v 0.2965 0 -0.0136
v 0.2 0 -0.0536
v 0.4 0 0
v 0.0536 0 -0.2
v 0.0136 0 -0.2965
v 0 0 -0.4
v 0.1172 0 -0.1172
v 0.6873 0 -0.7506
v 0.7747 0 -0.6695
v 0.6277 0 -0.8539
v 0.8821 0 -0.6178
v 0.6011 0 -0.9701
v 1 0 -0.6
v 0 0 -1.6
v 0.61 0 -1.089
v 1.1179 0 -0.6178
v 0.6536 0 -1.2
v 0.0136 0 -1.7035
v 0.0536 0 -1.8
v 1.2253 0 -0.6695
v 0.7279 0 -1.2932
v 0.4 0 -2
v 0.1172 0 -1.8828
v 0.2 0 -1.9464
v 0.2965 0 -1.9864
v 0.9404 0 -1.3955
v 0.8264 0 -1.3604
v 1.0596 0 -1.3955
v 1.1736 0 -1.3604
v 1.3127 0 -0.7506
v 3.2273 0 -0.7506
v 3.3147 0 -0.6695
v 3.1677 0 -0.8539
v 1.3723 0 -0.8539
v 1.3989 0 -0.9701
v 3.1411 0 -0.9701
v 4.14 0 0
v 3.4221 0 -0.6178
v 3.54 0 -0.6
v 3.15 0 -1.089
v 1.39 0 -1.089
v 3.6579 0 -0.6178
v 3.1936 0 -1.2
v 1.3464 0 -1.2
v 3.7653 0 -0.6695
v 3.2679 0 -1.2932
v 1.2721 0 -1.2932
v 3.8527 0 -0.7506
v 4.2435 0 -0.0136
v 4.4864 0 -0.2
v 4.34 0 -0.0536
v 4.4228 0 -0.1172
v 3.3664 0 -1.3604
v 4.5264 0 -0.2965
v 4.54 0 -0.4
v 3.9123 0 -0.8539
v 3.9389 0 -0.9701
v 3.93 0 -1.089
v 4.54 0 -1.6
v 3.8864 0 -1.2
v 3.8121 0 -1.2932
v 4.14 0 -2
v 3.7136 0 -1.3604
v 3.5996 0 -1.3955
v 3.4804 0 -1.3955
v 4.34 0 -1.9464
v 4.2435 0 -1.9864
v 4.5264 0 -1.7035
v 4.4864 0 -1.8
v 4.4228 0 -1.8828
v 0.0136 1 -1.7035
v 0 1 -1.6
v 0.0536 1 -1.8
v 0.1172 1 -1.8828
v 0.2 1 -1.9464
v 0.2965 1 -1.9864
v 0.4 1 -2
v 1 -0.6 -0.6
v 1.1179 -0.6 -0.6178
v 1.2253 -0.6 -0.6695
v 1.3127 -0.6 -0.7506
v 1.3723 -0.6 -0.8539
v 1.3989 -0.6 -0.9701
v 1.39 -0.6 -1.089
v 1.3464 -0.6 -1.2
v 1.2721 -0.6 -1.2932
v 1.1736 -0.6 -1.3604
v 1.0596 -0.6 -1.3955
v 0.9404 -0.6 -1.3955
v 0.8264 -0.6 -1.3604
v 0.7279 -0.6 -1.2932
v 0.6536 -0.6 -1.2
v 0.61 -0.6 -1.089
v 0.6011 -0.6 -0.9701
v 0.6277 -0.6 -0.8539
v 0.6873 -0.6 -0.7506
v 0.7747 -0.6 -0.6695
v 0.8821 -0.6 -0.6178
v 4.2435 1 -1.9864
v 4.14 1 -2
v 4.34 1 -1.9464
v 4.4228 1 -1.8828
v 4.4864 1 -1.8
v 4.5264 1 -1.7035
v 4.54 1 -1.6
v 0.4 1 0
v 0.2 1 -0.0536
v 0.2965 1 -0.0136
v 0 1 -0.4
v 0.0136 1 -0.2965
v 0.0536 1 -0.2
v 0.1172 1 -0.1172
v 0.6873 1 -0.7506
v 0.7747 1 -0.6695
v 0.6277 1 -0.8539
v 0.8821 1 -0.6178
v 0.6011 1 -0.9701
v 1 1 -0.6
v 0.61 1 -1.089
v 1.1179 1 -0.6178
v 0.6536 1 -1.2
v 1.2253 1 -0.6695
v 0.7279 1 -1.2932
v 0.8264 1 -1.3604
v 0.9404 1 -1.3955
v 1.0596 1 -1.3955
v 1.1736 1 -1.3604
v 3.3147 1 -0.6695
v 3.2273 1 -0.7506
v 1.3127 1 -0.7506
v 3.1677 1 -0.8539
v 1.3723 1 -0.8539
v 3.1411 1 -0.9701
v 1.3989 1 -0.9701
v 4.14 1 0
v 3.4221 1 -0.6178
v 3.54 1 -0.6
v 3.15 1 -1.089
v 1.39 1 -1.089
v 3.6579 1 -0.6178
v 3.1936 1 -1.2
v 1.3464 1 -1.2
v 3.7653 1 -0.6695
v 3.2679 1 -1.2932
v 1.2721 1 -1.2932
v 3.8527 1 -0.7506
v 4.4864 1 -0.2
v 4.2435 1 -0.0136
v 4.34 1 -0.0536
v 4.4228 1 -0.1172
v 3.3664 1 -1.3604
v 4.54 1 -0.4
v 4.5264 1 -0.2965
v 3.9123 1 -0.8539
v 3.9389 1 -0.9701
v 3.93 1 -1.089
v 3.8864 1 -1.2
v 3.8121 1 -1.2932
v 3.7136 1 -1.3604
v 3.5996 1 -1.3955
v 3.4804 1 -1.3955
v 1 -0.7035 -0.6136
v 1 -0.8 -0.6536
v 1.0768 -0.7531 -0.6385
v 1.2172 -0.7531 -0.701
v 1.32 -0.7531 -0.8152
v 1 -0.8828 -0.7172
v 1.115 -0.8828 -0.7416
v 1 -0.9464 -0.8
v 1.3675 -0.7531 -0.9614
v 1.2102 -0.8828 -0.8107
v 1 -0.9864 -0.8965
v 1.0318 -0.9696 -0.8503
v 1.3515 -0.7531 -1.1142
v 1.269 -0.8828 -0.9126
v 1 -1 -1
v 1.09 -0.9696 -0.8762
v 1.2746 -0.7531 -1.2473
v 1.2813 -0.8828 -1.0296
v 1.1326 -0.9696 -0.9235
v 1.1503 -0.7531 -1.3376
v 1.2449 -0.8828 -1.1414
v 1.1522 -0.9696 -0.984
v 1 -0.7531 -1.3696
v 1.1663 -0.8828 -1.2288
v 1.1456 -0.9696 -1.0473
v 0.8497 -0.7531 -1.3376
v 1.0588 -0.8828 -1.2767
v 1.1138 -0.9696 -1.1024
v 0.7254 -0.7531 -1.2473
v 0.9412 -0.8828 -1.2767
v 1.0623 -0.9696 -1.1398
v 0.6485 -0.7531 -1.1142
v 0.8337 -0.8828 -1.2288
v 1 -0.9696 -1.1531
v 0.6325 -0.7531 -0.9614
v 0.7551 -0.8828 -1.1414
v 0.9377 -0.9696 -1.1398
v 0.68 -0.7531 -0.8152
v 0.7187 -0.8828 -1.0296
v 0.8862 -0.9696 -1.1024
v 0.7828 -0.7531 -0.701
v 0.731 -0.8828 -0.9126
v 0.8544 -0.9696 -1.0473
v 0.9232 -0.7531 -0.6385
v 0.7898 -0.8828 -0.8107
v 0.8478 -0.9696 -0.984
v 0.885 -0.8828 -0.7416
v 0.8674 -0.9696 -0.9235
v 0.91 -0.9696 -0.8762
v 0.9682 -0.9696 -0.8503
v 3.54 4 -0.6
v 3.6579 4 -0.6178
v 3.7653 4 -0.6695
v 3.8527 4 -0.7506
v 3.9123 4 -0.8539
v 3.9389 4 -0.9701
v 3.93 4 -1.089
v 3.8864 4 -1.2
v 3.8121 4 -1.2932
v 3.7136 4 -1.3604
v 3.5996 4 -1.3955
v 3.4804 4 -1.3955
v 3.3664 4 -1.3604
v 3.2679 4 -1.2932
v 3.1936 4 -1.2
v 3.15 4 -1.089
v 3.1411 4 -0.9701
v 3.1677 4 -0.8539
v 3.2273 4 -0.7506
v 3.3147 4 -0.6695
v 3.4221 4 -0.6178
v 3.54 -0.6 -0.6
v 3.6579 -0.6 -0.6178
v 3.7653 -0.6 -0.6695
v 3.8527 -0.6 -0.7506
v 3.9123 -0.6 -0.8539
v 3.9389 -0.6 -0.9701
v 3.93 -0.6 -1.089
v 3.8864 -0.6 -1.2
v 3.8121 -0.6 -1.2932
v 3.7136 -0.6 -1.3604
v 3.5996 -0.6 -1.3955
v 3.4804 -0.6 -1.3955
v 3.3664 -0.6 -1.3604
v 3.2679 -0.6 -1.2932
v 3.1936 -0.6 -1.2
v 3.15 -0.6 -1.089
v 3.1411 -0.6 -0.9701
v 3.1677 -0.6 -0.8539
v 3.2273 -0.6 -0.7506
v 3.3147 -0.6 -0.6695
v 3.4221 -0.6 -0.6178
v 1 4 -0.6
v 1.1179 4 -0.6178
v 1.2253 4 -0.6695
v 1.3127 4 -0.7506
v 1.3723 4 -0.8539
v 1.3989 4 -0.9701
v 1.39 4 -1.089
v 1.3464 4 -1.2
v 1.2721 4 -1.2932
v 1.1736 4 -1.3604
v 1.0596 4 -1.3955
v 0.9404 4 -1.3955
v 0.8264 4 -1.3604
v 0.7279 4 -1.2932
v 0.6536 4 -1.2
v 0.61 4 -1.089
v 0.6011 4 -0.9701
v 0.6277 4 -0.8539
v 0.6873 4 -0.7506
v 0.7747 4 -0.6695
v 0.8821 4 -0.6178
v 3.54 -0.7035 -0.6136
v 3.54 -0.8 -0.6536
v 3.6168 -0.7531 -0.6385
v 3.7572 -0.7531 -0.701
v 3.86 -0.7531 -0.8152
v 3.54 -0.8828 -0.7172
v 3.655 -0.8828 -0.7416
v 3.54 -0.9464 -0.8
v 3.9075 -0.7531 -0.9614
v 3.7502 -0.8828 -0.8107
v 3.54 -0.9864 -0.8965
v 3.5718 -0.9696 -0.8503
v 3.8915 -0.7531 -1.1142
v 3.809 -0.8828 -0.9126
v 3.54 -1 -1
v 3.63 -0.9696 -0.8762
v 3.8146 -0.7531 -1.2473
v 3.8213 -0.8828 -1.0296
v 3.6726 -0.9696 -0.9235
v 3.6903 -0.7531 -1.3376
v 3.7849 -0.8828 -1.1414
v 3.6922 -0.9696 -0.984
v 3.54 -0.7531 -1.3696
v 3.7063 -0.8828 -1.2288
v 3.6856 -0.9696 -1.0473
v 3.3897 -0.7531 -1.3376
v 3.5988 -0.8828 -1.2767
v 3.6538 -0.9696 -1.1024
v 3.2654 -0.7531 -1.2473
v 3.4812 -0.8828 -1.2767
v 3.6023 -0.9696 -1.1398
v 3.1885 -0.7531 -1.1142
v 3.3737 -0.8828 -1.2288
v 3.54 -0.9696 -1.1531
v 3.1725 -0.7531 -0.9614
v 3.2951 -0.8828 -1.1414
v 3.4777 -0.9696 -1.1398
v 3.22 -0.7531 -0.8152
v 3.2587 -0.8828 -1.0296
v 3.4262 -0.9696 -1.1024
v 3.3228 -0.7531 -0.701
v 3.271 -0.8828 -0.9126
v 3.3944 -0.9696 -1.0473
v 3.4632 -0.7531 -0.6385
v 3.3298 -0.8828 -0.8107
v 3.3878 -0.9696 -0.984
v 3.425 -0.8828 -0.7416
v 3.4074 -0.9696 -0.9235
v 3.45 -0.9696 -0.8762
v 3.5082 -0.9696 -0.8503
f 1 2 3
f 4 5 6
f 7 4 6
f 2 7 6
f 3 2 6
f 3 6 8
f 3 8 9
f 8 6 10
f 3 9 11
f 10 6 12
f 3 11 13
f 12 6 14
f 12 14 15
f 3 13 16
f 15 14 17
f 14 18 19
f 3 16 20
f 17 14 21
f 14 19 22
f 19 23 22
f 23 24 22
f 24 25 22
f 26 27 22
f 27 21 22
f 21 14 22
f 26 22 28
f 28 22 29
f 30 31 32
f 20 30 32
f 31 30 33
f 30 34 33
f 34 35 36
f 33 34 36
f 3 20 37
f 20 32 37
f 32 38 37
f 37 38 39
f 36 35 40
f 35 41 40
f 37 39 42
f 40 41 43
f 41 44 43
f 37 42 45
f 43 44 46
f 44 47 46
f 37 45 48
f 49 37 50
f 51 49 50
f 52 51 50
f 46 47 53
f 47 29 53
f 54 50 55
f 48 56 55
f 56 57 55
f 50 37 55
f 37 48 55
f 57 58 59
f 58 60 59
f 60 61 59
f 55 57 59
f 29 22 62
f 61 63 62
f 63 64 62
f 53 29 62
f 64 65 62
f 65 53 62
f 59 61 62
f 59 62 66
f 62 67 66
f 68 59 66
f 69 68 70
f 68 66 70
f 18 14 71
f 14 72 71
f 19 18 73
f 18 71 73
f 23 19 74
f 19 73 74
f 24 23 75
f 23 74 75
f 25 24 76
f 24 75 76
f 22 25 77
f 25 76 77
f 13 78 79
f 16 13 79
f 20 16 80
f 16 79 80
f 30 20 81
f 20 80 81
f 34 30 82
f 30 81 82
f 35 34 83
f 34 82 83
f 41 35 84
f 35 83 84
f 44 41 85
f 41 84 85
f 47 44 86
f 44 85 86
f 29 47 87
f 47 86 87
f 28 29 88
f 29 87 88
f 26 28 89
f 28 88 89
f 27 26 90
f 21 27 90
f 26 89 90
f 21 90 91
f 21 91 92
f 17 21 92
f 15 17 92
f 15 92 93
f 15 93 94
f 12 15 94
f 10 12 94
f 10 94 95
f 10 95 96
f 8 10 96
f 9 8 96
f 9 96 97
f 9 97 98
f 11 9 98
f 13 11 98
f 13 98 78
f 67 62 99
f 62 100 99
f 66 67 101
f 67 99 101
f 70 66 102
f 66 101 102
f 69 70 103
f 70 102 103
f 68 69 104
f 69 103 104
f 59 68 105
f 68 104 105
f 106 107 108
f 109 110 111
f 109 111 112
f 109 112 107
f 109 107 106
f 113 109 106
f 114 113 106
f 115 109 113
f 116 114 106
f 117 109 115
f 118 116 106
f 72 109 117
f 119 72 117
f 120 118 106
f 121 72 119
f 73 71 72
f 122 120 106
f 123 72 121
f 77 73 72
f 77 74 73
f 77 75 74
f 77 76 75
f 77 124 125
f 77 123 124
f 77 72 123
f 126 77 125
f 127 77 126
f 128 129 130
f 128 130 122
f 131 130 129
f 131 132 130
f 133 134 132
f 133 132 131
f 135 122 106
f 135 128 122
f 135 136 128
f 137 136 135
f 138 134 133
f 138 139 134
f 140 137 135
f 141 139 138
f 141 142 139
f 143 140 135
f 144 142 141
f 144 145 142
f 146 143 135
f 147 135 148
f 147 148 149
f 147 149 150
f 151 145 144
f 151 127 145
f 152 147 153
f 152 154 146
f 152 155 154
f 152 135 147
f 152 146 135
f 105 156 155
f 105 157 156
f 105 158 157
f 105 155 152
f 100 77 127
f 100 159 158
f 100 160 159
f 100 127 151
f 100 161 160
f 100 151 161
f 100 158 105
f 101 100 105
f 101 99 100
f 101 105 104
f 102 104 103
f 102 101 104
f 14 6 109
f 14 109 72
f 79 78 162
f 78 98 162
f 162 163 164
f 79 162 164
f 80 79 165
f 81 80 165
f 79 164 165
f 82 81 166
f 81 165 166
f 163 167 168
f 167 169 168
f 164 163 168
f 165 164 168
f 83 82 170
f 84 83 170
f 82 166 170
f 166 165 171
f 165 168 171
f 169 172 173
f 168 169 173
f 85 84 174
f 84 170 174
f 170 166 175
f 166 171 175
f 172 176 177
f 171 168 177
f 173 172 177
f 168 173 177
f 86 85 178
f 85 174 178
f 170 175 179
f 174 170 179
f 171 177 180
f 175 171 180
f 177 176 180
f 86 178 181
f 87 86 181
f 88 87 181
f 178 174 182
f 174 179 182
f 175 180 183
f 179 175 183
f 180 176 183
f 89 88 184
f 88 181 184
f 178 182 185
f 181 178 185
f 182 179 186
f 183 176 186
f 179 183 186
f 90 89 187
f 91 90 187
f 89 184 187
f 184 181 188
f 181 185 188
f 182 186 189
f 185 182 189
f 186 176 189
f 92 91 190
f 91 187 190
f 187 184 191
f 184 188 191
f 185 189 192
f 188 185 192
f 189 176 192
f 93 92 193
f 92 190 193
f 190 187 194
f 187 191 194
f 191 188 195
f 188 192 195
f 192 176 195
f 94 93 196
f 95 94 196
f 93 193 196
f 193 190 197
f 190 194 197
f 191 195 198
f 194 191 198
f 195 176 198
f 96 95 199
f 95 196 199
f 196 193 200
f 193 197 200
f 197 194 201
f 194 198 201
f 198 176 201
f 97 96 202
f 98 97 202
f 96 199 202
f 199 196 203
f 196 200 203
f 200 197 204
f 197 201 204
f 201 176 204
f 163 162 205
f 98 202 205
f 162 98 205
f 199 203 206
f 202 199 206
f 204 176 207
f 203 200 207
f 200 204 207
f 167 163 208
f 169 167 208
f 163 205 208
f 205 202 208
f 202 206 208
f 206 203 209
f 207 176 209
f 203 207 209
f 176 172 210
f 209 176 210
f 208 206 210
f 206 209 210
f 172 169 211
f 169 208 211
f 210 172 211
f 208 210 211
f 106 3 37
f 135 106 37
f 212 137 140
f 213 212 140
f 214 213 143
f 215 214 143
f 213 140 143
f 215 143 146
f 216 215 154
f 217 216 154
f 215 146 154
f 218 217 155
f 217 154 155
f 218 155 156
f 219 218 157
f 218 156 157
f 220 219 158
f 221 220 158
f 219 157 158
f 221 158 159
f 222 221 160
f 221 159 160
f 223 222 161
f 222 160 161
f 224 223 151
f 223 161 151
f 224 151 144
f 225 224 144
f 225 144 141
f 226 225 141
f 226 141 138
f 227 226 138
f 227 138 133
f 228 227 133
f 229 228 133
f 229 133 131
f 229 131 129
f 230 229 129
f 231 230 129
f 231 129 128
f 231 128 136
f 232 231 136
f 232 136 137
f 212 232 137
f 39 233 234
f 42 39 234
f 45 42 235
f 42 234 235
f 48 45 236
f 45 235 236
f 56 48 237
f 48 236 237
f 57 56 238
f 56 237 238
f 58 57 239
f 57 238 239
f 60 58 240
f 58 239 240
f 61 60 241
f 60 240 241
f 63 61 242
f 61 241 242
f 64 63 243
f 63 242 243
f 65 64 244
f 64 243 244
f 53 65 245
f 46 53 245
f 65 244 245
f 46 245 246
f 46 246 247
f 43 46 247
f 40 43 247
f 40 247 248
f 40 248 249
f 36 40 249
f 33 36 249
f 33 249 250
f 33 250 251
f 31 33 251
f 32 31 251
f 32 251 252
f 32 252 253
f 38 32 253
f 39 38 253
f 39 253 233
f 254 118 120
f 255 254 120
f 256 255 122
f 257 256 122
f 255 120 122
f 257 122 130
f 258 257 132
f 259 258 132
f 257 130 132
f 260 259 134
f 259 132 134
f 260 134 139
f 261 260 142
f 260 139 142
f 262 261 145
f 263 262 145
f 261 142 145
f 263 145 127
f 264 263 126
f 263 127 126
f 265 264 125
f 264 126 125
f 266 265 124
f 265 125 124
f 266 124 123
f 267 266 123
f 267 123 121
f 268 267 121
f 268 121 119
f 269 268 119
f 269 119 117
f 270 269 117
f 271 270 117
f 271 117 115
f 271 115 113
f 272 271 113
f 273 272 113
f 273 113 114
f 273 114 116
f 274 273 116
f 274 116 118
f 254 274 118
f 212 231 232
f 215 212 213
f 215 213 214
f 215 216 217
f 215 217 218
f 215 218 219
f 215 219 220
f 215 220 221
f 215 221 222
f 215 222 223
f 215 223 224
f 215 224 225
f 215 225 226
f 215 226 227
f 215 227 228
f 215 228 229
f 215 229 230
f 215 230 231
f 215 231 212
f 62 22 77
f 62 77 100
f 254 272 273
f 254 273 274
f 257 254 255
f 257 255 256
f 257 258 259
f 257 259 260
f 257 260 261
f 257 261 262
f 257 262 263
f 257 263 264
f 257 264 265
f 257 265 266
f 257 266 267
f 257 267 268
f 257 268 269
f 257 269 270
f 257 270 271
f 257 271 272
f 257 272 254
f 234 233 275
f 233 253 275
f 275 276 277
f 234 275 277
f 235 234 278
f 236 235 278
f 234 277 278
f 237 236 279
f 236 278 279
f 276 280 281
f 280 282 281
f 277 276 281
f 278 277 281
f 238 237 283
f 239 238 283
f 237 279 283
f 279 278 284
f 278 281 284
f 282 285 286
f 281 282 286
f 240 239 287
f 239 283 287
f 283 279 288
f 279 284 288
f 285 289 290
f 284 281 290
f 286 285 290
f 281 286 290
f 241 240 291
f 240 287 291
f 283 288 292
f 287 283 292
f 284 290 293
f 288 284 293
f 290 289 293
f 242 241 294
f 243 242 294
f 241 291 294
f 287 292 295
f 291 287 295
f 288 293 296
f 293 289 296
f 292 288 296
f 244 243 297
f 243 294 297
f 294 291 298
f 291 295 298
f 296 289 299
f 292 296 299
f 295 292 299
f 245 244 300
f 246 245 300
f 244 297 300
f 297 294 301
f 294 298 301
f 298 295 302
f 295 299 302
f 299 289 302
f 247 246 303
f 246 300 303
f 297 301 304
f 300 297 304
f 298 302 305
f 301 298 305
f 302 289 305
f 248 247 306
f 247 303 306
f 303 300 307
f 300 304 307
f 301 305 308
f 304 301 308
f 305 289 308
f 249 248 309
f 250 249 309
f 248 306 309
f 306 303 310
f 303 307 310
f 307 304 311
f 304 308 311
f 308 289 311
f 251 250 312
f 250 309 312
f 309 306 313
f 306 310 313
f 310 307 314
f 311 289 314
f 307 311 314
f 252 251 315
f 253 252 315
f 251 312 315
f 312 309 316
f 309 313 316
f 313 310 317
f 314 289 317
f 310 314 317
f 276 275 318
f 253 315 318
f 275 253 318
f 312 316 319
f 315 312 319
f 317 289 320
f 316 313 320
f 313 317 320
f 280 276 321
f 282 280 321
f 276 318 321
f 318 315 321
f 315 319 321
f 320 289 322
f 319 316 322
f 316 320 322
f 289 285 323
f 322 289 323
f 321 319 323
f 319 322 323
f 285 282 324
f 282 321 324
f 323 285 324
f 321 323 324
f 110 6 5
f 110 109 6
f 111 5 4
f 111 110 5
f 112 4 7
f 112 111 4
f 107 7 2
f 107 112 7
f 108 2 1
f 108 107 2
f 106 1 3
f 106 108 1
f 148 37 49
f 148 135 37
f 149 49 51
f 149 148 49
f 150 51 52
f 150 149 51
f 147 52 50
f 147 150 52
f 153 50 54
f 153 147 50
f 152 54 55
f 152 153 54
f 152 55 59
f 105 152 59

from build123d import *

# Parameters (mm, degrees)
SKETCH1_W                = 4.54
SKETCH1_H                = 2
SKETCH1_R                = 0.4
BOSS_EXTRUDE1_DEPTH      = 1
FILLET2_R                = 0.4
BOSS_EXTRUDE2_DEPTH      = 3
BOSS_EXTRUDE2_DEPTH_BACK = 2
SKETCH2_R                = 0.4
FILLET1_R                = 0.4


with BuildPart() as part:
    # Sketch1 → Boss-Extrude1 (new body)
    with BuildSketch(Plane(origin=(0, 0, 0), x_dir=(1, 0, 0), z_dir=(0, 1, 0))):
        with Locations((2.27, 1)):
            Rectangle(SKETCH1_W, SKETCH1_H)
        with Locations(Location((1, 1, 0), (0, 0, 270))):
            Circle(SKETCH1_R, mode=Mode.SUBTRACT)
        with Locations(Location((3.54, 1, 0), (0, 0, 270))):
            Circle(SKETCH1_R, mode=Mode.SUBTRACT)
    extrude(amount=BOSS_EXTRUDE1_DEPTH)

    # Fillet2
    fillet2_edges = [part.edges().sort_by_distance(p)[0] for p in [
        (0, 0.5, -2),
        (4.54, 0.5, -2),
        (4.54, 0.5, 0),
        (0, 0.5, 0),
    ]]
    fillet(fillet2_edges, radius=FILLET2_R)

    # Sketch2 → Boss-Extrude2 (add, two sides: drawn at the far end of the back side and taken through both)
    with BuildSketch(Plane(origin=(0, 1, 0), x_dir=(1, 0, 0), z_dir=(0, 1, 0)).offset(-BOSS_EXTRUDE2_DEPTH_BACK)):
        with Locations(Location((1, 1, 0), (0, 0, 270))):
            Circle(SKETCH2_R)
        with Locations(Location((3.54, 1, 0), (0, 0, 270))):
            Circle(SKETCH2_R)
    extrude(amount=BOSS_EXTRUDE2_DEPTH + BOSS_EXTRUDE2_DEPTH_BACK)

    # Fillet1
    fillet1_edges = [part.edges().sort_by_distance(p)[0] for p in [
        (1, -1, -1.4),
        (3.54, -1, -1.4),
    ]]
    fillet(fillet1_edges, radius=FILLET1_R)


solid = part.part
